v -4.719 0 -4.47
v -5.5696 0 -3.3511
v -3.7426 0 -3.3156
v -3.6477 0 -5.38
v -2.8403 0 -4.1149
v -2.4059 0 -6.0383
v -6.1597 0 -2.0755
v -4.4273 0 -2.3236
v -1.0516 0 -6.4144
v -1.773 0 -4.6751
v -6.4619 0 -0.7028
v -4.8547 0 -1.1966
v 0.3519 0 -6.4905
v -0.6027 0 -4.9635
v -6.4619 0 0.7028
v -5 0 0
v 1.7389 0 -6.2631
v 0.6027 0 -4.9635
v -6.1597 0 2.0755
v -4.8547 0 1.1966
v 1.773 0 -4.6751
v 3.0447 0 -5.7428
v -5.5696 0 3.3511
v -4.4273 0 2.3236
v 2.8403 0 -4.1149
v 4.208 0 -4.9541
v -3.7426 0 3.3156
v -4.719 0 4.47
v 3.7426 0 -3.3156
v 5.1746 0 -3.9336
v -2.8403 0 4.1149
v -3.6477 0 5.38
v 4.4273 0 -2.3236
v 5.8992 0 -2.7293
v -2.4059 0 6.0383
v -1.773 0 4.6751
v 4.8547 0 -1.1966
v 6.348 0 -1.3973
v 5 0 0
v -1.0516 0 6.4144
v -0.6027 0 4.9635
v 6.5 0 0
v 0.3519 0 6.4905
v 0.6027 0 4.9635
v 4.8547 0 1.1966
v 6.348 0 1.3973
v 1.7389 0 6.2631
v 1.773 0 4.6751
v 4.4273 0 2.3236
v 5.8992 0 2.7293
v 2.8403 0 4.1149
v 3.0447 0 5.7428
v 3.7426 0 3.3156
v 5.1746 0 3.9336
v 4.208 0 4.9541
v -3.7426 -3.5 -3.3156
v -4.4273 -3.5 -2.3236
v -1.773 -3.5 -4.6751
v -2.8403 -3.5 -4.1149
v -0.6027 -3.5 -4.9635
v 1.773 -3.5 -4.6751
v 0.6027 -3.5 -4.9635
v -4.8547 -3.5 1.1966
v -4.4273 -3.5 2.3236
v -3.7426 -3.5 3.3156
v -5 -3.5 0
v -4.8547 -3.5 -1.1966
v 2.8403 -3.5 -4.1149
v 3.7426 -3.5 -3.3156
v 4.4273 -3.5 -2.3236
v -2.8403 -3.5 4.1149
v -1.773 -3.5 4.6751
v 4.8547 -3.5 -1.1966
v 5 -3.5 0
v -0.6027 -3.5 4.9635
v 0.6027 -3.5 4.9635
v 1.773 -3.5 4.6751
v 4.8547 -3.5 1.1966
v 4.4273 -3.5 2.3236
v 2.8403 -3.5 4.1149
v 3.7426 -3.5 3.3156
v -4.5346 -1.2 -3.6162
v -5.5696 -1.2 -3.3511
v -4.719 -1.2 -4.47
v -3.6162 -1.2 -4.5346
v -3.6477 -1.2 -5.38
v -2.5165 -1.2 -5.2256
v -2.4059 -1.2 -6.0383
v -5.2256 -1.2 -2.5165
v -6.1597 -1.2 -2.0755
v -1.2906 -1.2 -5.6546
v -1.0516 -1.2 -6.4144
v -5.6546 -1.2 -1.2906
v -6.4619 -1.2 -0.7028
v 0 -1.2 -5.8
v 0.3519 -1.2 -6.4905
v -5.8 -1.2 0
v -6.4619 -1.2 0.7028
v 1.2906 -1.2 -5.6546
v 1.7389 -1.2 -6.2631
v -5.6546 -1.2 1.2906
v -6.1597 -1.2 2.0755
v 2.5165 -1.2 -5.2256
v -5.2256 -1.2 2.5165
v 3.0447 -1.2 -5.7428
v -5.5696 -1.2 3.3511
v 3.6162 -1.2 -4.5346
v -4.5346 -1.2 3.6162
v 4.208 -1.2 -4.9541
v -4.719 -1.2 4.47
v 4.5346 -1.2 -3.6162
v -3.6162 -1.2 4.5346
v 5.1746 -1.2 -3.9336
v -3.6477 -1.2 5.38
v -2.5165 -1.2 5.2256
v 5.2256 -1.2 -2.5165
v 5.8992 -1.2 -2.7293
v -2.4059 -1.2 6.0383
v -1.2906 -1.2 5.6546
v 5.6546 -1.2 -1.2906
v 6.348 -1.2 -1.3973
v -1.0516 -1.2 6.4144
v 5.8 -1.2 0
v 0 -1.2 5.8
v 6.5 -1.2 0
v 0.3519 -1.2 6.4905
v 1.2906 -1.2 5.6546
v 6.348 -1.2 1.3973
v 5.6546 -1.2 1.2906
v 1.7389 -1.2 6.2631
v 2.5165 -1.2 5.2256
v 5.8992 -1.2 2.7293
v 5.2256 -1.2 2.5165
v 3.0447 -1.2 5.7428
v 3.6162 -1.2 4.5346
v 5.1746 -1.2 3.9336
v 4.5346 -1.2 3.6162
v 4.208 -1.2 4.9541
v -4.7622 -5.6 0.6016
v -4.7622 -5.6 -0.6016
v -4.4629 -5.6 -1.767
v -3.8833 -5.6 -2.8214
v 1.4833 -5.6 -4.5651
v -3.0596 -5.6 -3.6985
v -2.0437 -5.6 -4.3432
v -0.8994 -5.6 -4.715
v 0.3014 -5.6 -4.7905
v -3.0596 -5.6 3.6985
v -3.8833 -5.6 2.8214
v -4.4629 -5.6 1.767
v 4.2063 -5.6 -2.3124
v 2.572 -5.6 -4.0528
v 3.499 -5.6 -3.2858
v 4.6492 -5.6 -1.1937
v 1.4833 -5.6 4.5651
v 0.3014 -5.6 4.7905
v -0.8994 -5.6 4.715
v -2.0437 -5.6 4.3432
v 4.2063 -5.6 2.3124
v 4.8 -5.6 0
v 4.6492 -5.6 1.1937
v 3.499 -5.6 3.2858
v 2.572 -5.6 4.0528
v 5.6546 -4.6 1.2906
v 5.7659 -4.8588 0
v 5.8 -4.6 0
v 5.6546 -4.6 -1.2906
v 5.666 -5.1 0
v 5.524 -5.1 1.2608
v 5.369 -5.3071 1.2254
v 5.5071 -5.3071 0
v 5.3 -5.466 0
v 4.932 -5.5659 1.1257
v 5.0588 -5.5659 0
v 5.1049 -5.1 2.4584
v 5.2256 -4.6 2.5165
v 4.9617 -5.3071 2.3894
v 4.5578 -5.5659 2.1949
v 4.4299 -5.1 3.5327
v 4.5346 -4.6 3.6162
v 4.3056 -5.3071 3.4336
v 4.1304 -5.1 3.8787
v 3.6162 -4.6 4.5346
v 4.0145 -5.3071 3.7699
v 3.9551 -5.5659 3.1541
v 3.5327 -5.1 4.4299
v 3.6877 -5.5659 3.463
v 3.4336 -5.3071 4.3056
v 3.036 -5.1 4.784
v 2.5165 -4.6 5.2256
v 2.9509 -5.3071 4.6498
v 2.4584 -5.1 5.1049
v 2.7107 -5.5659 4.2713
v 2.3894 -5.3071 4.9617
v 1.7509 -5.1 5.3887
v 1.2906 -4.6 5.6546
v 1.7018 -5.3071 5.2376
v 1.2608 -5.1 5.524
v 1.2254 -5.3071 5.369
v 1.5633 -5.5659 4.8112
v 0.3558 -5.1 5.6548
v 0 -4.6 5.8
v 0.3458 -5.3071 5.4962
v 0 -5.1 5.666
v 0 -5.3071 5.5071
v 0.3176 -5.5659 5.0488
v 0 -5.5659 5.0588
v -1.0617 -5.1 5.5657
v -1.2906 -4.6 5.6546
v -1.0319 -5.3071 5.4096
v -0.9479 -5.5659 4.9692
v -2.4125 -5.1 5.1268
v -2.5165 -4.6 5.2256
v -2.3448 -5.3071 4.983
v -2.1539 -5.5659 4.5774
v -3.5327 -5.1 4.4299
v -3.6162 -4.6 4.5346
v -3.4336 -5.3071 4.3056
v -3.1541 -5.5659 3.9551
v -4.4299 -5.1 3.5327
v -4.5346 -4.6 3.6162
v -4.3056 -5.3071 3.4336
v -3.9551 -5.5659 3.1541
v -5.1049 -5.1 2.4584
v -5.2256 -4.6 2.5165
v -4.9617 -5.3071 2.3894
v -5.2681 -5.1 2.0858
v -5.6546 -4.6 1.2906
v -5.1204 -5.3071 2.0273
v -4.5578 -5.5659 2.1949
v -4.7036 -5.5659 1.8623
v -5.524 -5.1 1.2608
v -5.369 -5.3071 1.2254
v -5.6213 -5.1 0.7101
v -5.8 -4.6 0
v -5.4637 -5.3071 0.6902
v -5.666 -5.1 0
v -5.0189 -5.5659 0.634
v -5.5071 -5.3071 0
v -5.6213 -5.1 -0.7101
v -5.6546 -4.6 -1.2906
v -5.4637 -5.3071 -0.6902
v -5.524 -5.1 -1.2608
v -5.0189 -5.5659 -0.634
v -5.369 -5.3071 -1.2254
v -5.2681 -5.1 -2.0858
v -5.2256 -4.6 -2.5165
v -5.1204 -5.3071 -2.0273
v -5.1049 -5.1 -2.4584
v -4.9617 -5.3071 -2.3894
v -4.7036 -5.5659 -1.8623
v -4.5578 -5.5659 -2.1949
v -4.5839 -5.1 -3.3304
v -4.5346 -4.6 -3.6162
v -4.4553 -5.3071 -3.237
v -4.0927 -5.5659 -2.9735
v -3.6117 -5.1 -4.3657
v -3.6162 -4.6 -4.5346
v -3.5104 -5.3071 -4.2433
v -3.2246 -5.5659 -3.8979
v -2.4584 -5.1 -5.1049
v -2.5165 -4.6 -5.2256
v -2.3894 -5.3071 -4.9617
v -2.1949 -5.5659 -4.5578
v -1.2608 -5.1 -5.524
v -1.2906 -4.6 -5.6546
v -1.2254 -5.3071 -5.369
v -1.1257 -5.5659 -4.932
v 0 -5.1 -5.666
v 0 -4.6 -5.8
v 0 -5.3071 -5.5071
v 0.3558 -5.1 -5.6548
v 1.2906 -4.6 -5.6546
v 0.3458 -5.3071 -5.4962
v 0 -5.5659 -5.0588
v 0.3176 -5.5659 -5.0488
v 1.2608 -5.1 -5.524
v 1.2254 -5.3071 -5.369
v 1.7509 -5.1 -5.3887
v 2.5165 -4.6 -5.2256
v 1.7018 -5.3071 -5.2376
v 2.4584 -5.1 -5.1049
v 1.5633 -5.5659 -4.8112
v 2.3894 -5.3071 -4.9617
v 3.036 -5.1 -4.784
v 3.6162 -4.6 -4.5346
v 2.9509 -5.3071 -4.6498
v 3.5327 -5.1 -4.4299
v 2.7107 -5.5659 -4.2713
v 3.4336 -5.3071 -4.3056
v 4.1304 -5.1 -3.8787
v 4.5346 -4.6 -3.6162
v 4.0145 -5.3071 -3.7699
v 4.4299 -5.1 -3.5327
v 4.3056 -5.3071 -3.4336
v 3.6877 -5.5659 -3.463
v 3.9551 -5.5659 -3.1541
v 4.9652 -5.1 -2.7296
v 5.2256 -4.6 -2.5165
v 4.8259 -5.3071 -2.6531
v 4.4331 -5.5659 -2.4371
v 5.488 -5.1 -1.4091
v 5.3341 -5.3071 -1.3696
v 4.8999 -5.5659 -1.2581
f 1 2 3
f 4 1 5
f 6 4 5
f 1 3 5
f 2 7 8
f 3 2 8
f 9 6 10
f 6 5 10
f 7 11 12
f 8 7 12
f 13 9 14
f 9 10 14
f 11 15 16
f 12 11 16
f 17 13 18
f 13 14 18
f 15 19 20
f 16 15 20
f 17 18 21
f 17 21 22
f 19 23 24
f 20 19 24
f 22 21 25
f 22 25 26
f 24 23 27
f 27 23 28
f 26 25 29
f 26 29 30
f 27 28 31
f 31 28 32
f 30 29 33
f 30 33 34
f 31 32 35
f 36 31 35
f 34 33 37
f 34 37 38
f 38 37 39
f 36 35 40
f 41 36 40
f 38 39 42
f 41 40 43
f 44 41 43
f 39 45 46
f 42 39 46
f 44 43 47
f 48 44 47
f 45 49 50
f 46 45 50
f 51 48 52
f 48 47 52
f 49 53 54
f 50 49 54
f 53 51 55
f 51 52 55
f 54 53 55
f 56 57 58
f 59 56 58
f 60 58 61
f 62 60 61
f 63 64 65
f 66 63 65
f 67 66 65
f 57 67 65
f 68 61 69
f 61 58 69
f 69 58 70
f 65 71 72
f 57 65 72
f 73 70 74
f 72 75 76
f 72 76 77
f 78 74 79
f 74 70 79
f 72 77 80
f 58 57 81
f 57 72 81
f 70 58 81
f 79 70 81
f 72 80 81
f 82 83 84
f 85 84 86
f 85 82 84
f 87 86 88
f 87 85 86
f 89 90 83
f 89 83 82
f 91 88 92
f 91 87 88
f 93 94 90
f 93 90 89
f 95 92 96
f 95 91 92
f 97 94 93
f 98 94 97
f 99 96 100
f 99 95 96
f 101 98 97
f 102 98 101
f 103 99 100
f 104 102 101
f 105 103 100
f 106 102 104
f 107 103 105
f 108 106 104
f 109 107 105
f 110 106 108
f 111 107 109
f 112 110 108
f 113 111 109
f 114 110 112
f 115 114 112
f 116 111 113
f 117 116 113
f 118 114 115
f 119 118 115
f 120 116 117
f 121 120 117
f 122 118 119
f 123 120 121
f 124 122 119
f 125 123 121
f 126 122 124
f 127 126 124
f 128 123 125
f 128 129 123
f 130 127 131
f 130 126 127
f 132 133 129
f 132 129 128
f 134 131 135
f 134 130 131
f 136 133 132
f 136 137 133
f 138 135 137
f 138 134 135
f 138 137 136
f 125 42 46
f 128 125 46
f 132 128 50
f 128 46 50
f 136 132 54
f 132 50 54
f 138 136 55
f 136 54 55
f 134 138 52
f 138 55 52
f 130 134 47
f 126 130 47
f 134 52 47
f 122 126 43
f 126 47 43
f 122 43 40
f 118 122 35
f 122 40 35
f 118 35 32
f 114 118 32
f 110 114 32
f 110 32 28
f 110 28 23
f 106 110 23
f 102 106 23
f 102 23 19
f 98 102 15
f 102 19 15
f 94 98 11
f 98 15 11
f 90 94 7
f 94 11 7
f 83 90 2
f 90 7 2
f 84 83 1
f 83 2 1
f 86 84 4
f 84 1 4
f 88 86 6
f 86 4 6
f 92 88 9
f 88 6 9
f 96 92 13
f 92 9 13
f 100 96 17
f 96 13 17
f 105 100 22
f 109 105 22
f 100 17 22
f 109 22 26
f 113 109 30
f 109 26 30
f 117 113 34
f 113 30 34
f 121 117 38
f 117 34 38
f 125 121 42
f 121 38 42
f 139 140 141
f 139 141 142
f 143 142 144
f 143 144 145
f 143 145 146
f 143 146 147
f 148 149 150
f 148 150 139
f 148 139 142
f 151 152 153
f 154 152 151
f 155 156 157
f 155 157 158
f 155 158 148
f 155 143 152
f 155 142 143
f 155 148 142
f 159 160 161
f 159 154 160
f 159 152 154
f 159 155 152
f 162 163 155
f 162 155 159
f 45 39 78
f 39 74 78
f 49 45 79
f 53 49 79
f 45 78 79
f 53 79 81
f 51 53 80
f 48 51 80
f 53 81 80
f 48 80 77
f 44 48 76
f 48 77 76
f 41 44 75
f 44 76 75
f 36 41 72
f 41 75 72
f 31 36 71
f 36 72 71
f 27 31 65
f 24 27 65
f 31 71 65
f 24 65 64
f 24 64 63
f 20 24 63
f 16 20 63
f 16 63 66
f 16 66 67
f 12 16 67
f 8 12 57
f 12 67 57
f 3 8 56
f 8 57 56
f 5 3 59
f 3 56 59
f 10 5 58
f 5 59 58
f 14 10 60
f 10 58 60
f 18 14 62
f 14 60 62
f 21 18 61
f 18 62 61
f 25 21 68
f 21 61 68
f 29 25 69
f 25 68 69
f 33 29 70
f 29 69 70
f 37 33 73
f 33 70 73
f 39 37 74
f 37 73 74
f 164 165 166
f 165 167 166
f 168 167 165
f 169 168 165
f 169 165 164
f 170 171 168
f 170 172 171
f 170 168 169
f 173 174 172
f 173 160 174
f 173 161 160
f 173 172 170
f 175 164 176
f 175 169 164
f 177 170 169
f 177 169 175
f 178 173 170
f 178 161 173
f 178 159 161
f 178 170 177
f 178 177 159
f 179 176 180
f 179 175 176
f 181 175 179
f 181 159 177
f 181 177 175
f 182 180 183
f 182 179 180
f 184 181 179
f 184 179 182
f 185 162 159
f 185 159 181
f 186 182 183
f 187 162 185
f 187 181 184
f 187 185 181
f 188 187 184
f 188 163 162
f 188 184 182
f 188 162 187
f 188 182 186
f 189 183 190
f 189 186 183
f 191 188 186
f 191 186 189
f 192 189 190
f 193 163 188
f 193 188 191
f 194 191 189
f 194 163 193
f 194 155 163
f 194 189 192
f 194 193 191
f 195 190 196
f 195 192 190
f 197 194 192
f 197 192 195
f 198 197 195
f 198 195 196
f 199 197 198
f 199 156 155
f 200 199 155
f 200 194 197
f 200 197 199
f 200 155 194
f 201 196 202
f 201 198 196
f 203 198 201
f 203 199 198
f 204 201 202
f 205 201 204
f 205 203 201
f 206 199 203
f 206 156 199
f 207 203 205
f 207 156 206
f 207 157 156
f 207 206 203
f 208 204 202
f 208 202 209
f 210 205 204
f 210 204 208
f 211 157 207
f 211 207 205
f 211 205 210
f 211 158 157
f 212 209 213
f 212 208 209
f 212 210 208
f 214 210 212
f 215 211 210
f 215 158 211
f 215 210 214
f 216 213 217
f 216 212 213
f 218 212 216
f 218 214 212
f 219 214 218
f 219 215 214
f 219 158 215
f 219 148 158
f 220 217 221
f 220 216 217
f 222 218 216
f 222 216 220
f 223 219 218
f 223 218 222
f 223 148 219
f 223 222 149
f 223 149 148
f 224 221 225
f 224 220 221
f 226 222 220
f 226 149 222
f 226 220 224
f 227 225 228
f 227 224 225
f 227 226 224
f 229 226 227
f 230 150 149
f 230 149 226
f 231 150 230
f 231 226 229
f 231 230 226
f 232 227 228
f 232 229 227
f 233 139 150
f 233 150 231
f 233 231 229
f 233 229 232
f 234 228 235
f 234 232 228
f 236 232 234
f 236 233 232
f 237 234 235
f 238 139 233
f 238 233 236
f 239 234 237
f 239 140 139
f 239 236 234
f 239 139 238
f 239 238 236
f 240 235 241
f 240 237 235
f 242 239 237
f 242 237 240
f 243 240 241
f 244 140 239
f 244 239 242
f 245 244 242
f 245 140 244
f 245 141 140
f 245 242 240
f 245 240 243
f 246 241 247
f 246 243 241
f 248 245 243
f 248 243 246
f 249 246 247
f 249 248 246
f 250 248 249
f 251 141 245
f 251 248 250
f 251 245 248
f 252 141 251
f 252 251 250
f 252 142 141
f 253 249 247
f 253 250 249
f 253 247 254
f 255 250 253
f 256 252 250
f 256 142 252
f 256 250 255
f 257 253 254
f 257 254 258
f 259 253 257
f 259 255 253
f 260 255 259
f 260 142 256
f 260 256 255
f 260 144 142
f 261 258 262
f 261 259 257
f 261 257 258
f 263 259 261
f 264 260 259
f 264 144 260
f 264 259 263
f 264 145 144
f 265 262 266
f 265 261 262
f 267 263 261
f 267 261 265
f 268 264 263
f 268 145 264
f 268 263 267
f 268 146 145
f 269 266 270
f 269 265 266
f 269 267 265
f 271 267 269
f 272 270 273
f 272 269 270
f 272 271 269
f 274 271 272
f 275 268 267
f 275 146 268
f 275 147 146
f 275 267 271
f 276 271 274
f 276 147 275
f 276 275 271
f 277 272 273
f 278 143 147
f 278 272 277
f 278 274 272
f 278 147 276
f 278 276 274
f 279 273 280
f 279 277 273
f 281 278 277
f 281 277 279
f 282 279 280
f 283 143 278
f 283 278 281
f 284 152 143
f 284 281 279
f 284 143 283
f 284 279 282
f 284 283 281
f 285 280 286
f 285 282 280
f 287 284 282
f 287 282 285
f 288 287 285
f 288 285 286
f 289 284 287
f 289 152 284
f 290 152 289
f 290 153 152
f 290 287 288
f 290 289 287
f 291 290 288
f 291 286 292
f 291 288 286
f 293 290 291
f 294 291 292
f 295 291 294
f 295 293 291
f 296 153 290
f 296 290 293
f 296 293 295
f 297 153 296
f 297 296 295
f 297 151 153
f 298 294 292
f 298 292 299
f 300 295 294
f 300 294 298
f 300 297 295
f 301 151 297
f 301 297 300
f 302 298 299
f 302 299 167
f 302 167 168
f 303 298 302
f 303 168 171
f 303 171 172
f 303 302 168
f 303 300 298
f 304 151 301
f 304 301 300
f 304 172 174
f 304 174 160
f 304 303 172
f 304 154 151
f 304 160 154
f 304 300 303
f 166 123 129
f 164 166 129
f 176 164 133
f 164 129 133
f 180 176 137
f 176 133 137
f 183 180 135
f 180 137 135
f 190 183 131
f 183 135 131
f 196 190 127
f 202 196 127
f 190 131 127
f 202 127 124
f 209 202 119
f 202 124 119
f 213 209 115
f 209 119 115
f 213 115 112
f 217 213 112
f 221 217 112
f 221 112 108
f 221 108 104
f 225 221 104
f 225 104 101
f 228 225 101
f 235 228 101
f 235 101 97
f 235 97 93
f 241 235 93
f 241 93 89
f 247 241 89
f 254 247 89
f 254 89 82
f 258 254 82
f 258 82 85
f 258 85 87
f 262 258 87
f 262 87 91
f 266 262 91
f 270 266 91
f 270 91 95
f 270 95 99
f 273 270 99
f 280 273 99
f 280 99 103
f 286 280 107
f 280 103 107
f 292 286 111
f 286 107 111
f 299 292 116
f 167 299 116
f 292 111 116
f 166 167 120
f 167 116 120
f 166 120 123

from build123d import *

# Parameters (mm, degrees)
SKETCH070_R  = 6.5
PAD_DEPTH    = 1.2
SKETCH069_R  = 5.8
PAD001_DEPTH = 5.6
SKETCH071_R  = 5
POCKET_DEPTH = 3.5
FILLET_R     = 1


with BuildPart() as part:
    # Sketch070 → Pad (new body)
    with BuildSketch(Plane.XZ):
        Circle(SKETCH070_R)
    extrude(amount=PAD_DEPTH)

    # Sketch069 → Pad001 (join)
    with BuildSketch(Plane.XZ):
        Circle(SKETCH069_R)
    extrude(amount=PAD001_DEPTH)

    # Sketch071 → Pocket (cut, symmetric)
    with BuildSketch(Plane.XZ):
        Circle(SKETCH071_R)
    extrude(amount=POCKET_DEPTH, both=True, mode=Mode.SUBTRACT)

    # Fillet
    fillet_edges = [part.edges().sort_by_distance(p)[0] for p in [
        (-5.8, -5.6, 0),
    ]]
    fillet(fillet_edges, radius=FILLET_R)


solid = part.part
